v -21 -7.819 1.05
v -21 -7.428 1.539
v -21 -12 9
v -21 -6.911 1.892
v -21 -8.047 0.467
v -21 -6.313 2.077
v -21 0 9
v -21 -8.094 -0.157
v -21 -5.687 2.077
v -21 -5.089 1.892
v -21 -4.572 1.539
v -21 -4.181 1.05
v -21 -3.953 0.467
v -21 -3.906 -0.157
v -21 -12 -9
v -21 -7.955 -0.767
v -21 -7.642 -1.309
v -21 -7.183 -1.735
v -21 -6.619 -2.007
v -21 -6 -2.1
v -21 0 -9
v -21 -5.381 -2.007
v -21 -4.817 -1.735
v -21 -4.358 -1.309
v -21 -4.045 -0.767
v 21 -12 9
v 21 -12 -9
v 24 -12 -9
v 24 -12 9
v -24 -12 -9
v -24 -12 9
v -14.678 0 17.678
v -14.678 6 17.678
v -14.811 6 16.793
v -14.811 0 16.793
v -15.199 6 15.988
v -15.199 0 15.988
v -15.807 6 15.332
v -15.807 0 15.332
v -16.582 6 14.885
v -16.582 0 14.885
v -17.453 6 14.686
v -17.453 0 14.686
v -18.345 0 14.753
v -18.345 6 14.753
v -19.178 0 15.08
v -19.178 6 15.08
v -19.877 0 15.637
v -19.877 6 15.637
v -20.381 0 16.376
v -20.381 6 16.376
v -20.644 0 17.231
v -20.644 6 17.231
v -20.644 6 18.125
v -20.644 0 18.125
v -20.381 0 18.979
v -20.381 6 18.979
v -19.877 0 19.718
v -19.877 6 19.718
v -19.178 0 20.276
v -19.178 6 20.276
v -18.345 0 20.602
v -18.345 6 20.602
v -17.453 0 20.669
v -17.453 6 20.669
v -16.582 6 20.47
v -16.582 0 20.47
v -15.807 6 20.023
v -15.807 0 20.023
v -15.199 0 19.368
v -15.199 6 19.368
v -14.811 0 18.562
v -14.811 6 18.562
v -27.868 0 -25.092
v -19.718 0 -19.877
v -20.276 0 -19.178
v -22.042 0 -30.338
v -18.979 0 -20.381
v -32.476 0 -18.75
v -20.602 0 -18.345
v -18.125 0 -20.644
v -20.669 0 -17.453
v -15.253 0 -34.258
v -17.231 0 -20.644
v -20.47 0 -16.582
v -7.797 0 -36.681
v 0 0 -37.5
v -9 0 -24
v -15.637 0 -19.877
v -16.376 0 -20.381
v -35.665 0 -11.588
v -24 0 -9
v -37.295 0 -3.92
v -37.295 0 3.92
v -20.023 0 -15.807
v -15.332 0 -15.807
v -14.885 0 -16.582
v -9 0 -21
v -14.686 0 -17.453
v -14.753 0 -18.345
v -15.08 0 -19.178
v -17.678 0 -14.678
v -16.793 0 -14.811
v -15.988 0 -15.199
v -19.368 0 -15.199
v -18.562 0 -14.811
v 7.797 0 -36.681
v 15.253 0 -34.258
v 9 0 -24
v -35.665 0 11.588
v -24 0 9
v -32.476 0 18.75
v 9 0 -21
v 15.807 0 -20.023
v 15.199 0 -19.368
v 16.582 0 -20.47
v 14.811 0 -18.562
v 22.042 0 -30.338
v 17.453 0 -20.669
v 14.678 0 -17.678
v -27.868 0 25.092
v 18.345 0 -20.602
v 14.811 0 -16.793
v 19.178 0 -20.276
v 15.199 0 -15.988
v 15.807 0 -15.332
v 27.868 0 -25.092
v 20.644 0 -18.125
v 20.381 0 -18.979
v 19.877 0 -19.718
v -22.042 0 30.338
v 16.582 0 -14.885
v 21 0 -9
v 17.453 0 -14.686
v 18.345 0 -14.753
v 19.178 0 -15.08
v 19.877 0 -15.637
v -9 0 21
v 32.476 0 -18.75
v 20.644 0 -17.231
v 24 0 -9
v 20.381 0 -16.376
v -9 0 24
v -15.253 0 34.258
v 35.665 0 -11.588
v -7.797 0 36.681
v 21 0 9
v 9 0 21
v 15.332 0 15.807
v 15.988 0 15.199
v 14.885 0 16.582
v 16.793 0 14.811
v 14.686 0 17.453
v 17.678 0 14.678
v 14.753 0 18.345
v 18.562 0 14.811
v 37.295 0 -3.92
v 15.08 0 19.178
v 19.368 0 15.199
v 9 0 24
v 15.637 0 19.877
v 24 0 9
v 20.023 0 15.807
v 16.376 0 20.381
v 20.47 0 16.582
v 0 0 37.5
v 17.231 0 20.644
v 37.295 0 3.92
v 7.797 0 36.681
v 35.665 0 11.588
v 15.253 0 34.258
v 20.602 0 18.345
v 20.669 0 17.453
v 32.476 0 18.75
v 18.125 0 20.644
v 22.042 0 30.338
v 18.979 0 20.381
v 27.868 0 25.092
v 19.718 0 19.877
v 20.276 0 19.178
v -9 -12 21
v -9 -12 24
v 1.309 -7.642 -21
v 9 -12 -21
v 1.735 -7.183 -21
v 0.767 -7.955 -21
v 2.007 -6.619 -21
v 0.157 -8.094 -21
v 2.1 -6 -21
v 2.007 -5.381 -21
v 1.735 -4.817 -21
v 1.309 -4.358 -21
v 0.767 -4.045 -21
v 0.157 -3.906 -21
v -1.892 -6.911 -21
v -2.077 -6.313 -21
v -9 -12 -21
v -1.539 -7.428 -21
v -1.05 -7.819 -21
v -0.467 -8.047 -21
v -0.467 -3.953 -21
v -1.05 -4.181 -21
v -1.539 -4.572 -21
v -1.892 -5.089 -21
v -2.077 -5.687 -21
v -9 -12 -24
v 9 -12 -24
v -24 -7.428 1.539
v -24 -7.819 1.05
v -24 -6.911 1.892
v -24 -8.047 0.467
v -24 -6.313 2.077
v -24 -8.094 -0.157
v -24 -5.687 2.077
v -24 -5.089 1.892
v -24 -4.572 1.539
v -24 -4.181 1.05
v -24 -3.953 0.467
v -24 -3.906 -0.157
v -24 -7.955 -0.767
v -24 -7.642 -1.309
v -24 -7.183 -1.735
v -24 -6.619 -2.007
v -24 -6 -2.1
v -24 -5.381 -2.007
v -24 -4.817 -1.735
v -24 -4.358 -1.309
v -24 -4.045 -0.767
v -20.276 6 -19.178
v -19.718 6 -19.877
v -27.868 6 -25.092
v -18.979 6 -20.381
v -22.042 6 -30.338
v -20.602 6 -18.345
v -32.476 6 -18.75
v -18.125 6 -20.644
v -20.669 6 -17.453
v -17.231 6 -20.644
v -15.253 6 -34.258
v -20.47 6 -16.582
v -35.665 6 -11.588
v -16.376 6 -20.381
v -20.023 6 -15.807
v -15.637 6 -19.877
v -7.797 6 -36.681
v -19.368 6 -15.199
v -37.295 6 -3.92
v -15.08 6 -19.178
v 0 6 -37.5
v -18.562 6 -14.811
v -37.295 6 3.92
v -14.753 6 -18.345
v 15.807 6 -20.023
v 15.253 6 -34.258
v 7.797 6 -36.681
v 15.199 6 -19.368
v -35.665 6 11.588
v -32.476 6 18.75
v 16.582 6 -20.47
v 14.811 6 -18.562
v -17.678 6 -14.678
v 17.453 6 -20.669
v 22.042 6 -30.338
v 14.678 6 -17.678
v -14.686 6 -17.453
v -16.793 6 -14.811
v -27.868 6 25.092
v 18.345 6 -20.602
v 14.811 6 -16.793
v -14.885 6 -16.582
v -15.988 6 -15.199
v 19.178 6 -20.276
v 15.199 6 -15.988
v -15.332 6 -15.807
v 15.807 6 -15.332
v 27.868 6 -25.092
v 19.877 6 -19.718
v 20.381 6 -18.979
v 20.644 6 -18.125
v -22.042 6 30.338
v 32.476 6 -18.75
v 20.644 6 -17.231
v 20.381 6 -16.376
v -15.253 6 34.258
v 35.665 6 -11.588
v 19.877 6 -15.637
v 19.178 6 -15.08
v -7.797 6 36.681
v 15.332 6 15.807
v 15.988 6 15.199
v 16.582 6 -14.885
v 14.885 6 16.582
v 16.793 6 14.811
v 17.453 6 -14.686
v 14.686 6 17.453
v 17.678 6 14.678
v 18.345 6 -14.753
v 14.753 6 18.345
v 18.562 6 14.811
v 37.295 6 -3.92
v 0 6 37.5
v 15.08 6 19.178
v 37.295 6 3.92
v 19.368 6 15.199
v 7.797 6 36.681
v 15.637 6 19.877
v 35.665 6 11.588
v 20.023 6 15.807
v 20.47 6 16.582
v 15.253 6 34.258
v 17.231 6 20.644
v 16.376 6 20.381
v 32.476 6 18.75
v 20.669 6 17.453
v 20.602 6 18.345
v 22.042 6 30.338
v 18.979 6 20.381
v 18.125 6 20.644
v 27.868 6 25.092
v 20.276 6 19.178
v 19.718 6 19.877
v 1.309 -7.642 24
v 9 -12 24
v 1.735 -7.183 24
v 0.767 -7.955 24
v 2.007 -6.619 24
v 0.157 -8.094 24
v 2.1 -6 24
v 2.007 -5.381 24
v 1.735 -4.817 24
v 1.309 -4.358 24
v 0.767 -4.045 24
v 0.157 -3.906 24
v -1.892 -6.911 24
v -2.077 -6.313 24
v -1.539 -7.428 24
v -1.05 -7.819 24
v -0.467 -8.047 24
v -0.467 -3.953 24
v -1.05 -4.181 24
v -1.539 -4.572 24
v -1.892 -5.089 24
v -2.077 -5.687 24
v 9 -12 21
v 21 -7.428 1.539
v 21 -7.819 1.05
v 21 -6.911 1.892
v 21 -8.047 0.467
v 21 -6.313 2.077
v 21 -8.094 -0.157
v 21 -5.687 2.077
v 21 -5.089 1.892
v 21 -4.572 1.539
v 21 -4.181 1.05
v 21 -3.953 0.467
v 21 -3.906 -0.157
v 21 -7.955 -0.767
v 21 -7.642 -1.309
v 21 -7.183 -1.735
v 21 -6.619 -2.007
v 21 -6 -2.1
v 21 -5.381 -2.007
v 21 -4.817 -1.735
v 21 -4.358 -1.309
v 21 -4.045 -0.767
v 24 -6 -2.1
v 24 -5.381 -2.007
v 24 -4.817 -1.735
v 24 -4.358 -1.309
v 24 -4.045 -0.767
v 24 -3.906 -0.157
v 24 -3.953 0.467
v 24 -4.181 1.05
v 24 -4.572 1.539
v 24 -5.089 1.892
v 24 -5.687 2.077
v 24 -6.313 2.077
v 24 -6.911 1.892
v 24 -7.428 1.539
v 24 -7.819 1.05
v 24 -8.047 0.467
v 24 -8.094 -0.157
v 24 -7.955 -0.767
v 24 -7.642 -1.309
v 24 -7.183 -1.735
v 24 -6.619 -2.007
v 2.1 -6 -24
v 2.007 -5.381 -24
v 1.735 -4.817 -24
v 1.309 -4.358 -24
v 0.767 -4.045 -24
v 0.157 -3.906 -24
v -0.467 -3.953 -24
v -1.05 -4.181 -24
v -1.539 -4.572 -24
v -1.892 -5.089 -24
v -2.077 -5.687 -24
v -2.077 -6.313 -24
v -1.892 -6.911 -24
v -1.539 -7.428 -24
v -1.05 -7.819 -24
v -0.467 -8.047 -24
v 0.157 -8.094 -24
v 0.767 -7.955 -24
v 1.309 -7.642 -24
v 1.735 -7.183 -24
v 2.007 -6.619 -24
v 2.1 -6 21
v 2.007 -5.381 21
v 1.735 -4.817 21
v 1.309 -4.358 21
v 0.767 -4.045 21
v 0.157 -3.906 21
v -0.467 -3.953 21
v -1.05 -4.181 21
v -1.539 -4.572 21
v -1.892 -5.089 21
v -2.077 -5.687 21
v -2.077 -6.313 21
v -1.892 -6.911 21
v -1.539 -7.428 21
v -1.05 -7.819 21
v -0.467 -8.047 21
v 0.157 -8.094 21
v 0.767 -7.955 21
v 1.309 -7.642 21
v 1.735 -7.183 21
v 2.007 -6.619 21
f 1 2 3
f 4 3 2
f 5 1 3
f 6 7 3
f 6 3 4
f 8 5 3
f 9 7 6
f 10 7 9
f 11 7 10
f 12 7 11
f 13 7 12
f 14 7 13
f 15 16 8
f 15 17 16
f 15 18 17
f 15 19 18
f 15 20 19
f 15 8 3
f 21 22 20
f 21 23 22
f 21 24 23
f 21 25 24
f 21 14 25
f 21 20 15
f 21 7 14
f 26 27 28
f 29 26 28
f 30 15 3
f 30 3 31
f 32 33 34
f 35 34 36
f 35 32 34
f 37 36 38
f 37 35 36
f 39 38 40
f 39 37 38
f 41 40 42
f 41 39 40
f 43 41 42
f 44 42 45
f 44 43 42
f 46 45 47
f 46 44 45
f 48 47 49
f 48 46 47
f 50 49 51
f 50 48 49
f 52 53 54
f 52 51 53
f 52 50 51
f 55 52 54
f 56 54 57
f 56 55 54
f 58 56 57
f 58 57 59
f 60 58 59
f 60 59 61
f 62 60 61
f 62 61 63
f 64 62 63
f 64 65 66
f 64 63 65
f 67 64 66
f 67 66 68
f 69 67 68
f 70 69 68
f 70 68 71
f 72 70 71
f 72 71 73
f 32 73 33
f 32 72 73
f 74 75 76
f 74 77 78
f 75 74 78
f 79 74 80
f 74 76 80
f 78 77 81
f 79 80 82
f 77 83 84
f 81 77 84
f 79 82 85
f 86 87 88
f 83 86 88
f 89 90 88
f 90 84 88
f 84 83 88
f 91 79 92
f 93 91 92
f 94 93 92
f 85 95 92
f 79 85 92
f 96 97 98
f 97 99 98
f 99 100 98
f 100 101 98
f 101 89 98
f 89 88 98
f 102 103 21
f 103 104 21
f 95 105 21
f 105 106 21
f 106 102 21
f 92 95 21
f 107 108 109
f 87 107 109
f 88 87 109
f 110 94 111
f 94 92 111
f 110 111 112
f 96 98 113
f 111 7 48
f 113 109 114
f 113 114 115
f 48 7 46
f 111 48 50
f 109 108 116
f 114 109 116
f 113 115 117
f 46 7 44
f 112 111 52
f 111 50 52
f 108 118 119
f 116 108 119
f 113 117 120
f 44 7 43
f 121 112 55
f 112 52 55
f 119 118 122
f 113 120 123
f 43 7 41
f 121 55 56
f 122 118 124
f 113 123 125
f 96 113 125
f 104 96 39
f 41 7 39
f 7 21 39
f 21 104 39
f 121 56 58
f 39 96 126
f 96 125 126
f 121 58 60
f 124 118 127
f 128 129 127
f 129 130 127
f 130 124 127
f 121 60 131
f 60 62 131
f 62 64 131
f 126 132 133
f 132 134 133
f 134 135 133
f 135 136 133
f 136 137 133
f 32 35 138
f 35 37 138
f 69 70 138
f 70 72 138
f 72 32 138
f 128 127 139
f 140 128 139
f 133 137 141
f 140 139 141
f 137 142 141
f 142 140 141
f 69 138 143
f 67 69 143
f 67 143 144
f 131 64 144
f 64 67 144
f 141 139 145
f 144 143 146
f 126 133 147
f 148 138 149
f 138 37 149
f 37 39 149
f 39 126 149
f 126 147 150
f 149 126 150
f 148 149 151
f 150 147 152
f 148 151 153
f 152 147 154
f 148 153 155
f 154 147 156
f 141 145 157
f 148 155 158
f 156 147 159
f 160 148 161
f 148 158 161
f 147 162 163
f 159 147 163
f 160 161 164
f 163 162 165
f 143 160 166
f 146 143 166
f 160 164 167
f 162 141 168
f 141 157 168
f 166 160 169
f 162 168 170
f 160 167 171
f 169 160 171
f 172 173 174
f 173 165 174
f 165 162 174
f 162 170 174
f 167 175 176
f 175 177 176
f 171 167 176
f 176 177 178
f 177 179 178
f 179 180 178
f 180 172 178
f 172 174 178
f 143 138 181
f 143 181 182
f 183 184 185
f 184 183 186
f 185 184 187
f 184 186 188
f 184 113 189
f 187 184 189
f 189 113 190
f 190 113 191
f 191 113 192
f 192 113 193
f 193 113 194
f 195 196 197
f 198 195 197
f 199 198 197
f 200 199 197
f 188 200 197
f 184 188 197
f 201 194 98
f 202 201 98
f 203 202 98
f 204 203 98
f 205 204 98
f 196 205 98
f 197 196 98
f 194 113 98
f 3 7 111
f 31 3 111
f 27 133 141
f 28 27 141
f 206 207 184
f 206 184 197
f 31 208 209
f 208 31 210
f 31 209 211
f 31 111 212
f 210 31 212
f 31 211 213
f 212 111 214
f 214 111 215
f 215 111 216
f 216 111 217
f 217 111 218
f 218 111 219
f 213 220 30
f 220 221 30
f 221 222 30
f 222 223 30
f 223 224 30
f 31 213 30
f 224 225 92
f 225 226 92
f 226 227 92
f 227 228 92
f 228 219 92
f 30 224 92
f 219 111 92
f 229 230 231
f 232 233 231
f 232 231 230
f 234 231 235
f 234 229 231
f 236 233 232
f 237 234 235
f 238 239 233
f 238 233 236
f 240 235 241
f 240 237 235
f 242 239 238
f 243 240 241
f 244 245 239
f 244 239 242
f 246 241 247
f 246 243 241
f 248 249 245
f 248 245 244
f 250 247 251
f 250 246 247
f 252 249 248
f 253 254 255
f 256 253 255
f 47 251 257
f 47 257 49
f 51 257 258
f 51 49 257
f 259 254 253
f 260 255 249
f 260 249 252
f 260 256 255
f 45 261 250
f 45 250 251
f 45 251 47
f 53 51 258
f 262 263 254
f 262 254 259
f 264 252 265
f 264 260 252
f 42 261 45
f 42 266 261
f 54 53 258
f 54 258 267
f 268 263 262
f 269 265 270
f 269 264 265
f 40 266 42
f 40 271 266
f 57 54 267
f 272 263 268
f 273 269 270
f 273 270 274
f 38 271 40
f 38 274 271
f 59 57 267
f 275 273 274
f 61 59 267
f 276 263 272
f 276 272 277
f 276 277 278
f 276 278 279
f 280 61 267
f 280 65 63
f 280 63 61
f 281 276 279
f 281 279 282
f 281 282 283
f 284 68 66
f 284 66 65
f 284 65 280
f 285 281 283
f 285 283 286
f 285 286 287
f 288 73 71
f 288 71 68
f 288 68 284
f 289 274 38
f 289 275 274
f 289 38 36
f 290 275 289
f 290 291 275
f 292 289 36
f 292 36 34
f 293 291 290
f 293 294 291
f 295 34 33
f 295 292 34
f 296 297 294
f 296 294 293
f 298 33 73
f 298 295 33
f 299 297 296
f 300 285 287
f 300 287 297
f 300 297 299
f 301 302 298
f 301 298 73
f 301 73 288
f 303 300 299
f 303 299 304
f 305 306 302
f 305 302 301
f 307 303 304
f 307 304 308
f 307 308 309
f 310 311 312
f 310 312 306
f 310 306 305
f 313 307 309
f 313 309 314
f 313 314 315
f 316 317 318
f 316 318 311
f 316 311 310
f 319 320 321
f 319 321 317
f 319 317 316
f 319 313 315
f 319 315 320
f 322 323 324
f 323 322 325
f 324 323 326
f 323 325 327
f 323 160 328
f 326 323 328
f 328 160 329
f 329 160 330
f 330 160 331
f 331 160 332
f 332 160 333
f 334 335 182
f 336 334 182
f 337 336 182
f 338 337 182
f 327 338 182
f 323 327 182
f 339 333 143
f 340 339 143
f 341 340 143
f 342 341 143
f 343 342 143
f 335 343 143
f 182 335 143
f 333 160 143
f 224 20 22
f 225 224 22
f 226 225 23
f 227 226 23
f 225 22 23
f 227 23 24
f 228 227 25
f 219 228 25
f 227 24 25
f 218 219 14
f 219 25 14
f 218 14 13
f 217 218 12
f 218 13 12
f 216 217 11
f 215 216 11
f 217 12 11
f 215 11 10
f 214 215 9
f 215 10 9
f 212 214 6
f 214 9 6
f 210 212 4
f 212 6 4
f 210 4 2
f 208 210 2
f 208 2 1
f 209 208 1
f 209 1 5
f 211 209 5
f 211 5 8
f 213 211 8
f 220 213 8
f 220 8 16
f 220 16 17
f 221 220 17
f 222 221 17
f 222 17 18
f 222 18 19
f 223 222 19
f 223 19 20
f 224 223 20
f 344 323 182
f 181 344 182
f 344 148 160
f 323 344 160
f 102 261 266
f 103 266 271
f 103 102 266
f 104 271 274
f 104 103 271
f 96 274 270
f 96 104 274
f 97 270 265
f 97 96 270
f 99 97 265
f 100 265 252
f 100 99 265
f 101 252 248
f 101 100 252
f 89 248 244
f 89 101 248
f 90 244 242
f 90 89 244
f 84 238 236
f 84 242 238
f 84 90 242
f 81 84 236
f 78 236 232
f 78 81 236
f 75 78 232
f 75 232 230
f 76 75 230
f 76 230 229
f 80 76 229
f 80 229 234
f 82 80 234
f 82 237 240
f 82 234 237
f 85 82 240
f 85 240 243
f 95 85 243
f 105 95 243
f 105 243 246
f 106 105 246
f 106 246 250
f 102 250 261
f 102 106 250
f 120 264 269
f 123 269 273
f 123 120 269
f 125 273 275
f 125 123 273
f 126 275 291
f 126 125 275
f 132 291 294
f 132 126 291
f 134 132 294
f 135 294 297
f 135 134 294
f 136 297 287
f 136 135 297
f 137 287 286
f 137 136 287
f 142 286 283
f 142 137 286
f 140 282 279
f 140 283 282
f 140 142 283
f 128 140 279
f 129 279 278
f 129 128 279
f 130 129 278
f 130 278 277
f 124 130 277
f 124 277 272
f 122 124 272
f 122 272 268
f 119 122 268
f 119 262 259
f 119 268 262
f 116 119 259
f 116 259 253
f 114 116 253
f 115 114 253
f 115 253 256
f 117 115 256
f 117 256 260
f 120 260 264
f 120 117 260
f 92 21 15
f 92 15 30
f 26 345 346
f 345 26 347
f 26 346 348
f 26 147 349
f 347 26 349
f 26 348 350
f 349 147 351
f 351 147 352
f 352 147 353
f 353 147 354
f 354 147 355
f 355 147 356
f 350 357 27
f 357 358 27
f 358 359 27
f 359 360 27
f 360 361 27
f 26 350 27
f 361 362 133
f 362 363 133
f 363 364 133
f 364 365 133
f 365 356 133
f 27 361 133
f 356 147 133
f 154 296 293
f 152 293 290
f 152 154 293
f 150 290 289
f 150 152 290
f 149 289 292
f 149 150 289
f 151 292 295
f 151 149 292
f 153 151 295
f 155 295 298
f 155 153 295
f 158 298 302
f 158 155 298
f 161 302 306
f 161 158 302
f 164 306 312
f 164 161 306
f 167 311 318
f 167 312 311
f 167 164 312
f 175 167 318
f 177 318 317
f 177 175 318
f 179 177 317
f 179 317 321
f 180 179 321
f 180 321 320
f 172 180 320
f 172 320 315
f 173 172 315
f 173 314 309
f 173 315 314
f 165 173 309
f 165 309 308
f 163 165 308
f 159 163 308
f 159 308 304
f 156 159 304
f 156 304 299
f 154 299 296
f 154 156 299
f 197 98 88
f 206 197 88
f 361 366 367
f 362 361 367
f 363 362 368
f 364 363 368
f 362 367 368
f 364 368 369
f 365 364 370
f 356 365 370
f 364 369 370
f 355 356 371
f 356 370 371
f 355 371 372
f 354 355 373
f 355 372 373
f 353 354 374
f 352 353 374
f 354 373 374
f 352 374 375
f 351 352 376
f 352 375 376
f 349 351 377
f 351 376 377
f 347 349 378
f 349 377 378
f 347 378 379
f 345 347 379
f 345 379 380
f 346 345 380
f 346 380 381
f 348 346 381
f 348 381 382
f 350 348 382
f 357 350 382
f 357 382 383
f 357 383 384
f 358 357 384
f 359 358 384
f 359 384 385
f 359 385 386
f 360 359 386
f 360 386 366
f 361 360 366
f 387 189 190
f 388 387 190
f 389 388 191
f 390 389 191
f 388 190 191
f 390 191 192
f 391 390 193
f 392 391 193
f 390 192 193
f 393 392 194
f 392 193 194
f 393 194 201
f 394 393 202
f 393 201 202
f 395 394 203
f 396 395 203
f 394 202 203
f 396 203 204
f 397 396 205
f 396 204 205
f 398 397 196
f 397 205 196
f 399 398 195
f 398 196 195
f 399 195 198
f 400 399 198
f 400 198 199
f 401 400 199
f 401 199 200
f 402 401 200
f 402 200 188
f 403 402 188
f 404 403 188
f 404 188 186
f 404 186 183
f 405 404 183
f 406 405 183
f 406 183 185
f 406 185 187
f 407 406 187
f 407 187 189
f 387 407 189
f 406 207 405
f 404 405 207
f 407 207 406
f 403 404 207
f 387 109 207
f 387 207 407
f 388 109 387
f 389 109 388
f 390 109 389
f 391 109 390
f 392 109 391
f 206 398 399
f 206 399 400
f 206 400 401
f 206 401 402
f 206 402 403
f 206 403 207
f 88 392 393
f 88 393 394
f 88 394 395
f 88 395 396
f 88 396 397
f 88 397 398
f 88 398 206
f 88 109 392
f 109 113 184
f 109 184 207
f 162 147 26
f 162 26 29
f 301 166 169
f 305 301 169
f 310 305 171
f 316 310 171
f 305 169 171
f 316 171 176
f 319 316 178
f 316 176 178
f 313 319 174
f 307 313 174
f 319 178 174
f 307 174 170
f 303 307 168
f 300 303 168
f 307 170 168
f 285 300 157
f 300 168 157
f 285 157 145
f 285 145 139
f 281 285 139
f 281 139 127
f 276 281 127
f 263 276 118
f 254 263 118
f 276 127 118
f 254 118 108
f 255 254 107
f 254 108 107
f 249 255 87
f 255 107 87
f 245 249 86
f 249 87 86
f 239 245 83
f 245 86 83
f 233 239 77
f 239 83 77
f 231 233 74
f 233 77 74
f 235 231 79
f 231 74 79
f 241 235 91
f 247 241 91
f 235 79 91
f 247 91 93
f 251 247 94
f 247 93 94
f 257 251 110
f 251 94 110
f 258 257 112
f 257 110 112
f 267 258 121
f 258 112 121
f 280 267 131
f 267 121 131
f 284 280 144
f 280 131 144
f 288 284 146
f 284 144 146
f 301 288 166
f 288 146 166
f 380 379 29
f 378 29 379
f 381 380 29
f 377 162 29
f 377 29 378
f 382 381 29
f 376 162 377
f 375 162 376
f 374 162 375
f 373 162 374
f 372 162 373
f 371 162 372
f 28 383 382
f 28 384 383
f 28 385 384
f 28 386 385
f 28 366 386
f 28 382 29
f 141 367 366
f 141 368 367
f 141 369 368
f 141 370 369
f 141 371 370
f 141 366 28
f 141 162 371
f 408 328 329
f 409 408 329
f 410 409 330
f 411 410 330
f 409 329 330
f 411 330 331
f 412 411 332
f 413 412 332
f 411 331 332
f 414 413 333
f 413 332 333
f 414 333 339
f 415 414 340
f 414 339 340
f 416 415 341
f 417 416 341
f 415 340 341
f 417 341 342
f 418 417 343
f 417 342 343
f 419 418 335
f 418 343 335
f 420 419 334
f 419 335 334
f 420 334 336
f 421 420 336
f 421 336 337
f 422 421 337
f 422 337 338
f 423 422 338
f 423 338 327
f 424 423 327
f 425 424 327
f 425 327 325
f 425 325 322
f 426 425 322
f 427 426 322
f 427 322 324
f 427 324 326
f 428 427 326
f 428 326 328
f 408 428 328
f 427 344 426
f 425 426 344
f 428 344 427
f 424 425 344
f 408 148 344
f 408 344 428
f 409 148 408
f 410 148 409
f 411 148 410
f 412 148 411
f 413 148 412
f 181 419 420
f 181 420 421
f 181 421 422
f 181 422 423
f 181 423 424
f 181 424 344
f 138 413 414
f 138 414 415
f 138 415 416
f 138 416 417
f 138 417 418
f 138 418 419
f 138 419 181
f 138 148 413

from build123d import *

# Parameters (mm, degrees)
SKETCH_1_R               = 37.5
EXTRUDE_1_DEPTH          = 6
SKETCH_4_R               = 3
CUT_EXTRUDE_2_DEPTH      = 54.371340624
PATTERN_CIRCULAR_1_COUNT = 4
SKETCH_5_W               = 18
SKETCH_5_H               = 3
EXTRUDE_2_DEPTH          = 12
SKETCH_5_3_W             = 18
SKETCH_5_3_H             = 3
SKETCH_5_3_W_2           = 3
SKETCH_5_3_H_2           = 18
EXTRUDE_3_DEPTH          = 12
SKETCH_6_R               = 2.1
CUT_EXTRUDE_3_DEPTH      = 74.023968668
SKETCH_7_R               = 2.1
CUT_EXTRUDE_4_DEPTH      = 74.023968668


with BuildPart() as part:
    # 草图1 → 凸台-拉伸1 (new body)
    with BuildSketch(Plane(origin=(0, 0, 0), x_dir=(1, 0, 0), z_dir=(0, 1, 0))):
        Circle(SKETCH_1_R)
    extrude(amount=EXTRUDE_1_DEPTH)

    # 草图4 → 切除-拉伸2 (cut, through all)
    with BuildSketch(Plane(origin=(0, 0, 0), x_dir=(1, 0, 0), z_dir=(0, 1, 0))):
        with Locations((-17.67766953, 17.67766953)):
            Circle(SKETCH_4_R)
    cut_extrude_2 = extrude(amount=CUT_EXTRUDE_2_DEPTH, mode=Mode.SUBTRACT)

    # 阵列(圆周)1: 切除-拉伸2 ×4 about axis
    pattern_circular_1_axis = Axis((0, 0, 0), (0, -1, 0))
    for i in range(1, PATTERN_CIRCULAR_1_COUNT):
        add(cut_extrude_2.rotate(pattern_circular_1_axis, i * 360 / PATTERN_CIRCULAR_1_COUNT), mode=Mode.SUBTRACT)

    # 草图5 → 凸台-拉伸2 (add)
    with BuildSketch(Plane(origin=(0, 0, 0), x_dir=(-1, 0, 0), z_dir=(0, -1, 0))):
        with Locations((0, 22.5)):
            Rectangle(SKETCH_5_W, SKETCH_5_H)
    extrude_2 = extrude(amount=EXTRUDE_2_DEPTH)

    # 草图5<3> → 凸台-拉伸3 (add)
    with BuildSketch(Plane(origin=(0, 0, 0), x_dir=(-1, 0, 0), z_dir=(0, -1, 0))):
        with Locations((0, 22.5)):
            Rectangle(SKETCH_5_3_W, SKETCH_5_3_H)
        with Locations((22.5, 0)):
            Rectangle(SKETCH_5_3_W_2, SKETCH_5_3_H_2)
    extrude_3 = extrude(amount=EXTRUDE_3_DEPTH)

    # 镜向3: 凸台-拉伸2 across plane
    add(extrude_2.mirror(Plane.XY))

    # 镜向4: 凸台-拉伸3 across plane
    add(extrude_3.mirror(Plane(origin=(0, 0, 0), x_dir=(0, 0, 1), z_dir=(1, 0, 0))))

    # 草图6 → 切除-拉伸3 (cut, through all)
    with BuildSketch(Plane.XY.offset(24)):
        with Locations((0, -6)):
            Circle(SKETCH_6_R)
    extrude(amount=-CUT_EXTRUDE_3_DEPTH, mode=Mode.SUBTRACT)

    # 草图7 → 切除-拉伸4 (cut, through all)
    with BuildSketch(Plane(origin=(24, 0, 0), x_dir=(0, 0, -1), z_dir=(1, 0, 0))):
        with Locations((0, -6)):
            Circle(SKETCH_7_R)
    extrude(amount=-CUT_EXTRUDE_4_DEPTH, mode=Mode.SUBTRACT)


solid = part.part
